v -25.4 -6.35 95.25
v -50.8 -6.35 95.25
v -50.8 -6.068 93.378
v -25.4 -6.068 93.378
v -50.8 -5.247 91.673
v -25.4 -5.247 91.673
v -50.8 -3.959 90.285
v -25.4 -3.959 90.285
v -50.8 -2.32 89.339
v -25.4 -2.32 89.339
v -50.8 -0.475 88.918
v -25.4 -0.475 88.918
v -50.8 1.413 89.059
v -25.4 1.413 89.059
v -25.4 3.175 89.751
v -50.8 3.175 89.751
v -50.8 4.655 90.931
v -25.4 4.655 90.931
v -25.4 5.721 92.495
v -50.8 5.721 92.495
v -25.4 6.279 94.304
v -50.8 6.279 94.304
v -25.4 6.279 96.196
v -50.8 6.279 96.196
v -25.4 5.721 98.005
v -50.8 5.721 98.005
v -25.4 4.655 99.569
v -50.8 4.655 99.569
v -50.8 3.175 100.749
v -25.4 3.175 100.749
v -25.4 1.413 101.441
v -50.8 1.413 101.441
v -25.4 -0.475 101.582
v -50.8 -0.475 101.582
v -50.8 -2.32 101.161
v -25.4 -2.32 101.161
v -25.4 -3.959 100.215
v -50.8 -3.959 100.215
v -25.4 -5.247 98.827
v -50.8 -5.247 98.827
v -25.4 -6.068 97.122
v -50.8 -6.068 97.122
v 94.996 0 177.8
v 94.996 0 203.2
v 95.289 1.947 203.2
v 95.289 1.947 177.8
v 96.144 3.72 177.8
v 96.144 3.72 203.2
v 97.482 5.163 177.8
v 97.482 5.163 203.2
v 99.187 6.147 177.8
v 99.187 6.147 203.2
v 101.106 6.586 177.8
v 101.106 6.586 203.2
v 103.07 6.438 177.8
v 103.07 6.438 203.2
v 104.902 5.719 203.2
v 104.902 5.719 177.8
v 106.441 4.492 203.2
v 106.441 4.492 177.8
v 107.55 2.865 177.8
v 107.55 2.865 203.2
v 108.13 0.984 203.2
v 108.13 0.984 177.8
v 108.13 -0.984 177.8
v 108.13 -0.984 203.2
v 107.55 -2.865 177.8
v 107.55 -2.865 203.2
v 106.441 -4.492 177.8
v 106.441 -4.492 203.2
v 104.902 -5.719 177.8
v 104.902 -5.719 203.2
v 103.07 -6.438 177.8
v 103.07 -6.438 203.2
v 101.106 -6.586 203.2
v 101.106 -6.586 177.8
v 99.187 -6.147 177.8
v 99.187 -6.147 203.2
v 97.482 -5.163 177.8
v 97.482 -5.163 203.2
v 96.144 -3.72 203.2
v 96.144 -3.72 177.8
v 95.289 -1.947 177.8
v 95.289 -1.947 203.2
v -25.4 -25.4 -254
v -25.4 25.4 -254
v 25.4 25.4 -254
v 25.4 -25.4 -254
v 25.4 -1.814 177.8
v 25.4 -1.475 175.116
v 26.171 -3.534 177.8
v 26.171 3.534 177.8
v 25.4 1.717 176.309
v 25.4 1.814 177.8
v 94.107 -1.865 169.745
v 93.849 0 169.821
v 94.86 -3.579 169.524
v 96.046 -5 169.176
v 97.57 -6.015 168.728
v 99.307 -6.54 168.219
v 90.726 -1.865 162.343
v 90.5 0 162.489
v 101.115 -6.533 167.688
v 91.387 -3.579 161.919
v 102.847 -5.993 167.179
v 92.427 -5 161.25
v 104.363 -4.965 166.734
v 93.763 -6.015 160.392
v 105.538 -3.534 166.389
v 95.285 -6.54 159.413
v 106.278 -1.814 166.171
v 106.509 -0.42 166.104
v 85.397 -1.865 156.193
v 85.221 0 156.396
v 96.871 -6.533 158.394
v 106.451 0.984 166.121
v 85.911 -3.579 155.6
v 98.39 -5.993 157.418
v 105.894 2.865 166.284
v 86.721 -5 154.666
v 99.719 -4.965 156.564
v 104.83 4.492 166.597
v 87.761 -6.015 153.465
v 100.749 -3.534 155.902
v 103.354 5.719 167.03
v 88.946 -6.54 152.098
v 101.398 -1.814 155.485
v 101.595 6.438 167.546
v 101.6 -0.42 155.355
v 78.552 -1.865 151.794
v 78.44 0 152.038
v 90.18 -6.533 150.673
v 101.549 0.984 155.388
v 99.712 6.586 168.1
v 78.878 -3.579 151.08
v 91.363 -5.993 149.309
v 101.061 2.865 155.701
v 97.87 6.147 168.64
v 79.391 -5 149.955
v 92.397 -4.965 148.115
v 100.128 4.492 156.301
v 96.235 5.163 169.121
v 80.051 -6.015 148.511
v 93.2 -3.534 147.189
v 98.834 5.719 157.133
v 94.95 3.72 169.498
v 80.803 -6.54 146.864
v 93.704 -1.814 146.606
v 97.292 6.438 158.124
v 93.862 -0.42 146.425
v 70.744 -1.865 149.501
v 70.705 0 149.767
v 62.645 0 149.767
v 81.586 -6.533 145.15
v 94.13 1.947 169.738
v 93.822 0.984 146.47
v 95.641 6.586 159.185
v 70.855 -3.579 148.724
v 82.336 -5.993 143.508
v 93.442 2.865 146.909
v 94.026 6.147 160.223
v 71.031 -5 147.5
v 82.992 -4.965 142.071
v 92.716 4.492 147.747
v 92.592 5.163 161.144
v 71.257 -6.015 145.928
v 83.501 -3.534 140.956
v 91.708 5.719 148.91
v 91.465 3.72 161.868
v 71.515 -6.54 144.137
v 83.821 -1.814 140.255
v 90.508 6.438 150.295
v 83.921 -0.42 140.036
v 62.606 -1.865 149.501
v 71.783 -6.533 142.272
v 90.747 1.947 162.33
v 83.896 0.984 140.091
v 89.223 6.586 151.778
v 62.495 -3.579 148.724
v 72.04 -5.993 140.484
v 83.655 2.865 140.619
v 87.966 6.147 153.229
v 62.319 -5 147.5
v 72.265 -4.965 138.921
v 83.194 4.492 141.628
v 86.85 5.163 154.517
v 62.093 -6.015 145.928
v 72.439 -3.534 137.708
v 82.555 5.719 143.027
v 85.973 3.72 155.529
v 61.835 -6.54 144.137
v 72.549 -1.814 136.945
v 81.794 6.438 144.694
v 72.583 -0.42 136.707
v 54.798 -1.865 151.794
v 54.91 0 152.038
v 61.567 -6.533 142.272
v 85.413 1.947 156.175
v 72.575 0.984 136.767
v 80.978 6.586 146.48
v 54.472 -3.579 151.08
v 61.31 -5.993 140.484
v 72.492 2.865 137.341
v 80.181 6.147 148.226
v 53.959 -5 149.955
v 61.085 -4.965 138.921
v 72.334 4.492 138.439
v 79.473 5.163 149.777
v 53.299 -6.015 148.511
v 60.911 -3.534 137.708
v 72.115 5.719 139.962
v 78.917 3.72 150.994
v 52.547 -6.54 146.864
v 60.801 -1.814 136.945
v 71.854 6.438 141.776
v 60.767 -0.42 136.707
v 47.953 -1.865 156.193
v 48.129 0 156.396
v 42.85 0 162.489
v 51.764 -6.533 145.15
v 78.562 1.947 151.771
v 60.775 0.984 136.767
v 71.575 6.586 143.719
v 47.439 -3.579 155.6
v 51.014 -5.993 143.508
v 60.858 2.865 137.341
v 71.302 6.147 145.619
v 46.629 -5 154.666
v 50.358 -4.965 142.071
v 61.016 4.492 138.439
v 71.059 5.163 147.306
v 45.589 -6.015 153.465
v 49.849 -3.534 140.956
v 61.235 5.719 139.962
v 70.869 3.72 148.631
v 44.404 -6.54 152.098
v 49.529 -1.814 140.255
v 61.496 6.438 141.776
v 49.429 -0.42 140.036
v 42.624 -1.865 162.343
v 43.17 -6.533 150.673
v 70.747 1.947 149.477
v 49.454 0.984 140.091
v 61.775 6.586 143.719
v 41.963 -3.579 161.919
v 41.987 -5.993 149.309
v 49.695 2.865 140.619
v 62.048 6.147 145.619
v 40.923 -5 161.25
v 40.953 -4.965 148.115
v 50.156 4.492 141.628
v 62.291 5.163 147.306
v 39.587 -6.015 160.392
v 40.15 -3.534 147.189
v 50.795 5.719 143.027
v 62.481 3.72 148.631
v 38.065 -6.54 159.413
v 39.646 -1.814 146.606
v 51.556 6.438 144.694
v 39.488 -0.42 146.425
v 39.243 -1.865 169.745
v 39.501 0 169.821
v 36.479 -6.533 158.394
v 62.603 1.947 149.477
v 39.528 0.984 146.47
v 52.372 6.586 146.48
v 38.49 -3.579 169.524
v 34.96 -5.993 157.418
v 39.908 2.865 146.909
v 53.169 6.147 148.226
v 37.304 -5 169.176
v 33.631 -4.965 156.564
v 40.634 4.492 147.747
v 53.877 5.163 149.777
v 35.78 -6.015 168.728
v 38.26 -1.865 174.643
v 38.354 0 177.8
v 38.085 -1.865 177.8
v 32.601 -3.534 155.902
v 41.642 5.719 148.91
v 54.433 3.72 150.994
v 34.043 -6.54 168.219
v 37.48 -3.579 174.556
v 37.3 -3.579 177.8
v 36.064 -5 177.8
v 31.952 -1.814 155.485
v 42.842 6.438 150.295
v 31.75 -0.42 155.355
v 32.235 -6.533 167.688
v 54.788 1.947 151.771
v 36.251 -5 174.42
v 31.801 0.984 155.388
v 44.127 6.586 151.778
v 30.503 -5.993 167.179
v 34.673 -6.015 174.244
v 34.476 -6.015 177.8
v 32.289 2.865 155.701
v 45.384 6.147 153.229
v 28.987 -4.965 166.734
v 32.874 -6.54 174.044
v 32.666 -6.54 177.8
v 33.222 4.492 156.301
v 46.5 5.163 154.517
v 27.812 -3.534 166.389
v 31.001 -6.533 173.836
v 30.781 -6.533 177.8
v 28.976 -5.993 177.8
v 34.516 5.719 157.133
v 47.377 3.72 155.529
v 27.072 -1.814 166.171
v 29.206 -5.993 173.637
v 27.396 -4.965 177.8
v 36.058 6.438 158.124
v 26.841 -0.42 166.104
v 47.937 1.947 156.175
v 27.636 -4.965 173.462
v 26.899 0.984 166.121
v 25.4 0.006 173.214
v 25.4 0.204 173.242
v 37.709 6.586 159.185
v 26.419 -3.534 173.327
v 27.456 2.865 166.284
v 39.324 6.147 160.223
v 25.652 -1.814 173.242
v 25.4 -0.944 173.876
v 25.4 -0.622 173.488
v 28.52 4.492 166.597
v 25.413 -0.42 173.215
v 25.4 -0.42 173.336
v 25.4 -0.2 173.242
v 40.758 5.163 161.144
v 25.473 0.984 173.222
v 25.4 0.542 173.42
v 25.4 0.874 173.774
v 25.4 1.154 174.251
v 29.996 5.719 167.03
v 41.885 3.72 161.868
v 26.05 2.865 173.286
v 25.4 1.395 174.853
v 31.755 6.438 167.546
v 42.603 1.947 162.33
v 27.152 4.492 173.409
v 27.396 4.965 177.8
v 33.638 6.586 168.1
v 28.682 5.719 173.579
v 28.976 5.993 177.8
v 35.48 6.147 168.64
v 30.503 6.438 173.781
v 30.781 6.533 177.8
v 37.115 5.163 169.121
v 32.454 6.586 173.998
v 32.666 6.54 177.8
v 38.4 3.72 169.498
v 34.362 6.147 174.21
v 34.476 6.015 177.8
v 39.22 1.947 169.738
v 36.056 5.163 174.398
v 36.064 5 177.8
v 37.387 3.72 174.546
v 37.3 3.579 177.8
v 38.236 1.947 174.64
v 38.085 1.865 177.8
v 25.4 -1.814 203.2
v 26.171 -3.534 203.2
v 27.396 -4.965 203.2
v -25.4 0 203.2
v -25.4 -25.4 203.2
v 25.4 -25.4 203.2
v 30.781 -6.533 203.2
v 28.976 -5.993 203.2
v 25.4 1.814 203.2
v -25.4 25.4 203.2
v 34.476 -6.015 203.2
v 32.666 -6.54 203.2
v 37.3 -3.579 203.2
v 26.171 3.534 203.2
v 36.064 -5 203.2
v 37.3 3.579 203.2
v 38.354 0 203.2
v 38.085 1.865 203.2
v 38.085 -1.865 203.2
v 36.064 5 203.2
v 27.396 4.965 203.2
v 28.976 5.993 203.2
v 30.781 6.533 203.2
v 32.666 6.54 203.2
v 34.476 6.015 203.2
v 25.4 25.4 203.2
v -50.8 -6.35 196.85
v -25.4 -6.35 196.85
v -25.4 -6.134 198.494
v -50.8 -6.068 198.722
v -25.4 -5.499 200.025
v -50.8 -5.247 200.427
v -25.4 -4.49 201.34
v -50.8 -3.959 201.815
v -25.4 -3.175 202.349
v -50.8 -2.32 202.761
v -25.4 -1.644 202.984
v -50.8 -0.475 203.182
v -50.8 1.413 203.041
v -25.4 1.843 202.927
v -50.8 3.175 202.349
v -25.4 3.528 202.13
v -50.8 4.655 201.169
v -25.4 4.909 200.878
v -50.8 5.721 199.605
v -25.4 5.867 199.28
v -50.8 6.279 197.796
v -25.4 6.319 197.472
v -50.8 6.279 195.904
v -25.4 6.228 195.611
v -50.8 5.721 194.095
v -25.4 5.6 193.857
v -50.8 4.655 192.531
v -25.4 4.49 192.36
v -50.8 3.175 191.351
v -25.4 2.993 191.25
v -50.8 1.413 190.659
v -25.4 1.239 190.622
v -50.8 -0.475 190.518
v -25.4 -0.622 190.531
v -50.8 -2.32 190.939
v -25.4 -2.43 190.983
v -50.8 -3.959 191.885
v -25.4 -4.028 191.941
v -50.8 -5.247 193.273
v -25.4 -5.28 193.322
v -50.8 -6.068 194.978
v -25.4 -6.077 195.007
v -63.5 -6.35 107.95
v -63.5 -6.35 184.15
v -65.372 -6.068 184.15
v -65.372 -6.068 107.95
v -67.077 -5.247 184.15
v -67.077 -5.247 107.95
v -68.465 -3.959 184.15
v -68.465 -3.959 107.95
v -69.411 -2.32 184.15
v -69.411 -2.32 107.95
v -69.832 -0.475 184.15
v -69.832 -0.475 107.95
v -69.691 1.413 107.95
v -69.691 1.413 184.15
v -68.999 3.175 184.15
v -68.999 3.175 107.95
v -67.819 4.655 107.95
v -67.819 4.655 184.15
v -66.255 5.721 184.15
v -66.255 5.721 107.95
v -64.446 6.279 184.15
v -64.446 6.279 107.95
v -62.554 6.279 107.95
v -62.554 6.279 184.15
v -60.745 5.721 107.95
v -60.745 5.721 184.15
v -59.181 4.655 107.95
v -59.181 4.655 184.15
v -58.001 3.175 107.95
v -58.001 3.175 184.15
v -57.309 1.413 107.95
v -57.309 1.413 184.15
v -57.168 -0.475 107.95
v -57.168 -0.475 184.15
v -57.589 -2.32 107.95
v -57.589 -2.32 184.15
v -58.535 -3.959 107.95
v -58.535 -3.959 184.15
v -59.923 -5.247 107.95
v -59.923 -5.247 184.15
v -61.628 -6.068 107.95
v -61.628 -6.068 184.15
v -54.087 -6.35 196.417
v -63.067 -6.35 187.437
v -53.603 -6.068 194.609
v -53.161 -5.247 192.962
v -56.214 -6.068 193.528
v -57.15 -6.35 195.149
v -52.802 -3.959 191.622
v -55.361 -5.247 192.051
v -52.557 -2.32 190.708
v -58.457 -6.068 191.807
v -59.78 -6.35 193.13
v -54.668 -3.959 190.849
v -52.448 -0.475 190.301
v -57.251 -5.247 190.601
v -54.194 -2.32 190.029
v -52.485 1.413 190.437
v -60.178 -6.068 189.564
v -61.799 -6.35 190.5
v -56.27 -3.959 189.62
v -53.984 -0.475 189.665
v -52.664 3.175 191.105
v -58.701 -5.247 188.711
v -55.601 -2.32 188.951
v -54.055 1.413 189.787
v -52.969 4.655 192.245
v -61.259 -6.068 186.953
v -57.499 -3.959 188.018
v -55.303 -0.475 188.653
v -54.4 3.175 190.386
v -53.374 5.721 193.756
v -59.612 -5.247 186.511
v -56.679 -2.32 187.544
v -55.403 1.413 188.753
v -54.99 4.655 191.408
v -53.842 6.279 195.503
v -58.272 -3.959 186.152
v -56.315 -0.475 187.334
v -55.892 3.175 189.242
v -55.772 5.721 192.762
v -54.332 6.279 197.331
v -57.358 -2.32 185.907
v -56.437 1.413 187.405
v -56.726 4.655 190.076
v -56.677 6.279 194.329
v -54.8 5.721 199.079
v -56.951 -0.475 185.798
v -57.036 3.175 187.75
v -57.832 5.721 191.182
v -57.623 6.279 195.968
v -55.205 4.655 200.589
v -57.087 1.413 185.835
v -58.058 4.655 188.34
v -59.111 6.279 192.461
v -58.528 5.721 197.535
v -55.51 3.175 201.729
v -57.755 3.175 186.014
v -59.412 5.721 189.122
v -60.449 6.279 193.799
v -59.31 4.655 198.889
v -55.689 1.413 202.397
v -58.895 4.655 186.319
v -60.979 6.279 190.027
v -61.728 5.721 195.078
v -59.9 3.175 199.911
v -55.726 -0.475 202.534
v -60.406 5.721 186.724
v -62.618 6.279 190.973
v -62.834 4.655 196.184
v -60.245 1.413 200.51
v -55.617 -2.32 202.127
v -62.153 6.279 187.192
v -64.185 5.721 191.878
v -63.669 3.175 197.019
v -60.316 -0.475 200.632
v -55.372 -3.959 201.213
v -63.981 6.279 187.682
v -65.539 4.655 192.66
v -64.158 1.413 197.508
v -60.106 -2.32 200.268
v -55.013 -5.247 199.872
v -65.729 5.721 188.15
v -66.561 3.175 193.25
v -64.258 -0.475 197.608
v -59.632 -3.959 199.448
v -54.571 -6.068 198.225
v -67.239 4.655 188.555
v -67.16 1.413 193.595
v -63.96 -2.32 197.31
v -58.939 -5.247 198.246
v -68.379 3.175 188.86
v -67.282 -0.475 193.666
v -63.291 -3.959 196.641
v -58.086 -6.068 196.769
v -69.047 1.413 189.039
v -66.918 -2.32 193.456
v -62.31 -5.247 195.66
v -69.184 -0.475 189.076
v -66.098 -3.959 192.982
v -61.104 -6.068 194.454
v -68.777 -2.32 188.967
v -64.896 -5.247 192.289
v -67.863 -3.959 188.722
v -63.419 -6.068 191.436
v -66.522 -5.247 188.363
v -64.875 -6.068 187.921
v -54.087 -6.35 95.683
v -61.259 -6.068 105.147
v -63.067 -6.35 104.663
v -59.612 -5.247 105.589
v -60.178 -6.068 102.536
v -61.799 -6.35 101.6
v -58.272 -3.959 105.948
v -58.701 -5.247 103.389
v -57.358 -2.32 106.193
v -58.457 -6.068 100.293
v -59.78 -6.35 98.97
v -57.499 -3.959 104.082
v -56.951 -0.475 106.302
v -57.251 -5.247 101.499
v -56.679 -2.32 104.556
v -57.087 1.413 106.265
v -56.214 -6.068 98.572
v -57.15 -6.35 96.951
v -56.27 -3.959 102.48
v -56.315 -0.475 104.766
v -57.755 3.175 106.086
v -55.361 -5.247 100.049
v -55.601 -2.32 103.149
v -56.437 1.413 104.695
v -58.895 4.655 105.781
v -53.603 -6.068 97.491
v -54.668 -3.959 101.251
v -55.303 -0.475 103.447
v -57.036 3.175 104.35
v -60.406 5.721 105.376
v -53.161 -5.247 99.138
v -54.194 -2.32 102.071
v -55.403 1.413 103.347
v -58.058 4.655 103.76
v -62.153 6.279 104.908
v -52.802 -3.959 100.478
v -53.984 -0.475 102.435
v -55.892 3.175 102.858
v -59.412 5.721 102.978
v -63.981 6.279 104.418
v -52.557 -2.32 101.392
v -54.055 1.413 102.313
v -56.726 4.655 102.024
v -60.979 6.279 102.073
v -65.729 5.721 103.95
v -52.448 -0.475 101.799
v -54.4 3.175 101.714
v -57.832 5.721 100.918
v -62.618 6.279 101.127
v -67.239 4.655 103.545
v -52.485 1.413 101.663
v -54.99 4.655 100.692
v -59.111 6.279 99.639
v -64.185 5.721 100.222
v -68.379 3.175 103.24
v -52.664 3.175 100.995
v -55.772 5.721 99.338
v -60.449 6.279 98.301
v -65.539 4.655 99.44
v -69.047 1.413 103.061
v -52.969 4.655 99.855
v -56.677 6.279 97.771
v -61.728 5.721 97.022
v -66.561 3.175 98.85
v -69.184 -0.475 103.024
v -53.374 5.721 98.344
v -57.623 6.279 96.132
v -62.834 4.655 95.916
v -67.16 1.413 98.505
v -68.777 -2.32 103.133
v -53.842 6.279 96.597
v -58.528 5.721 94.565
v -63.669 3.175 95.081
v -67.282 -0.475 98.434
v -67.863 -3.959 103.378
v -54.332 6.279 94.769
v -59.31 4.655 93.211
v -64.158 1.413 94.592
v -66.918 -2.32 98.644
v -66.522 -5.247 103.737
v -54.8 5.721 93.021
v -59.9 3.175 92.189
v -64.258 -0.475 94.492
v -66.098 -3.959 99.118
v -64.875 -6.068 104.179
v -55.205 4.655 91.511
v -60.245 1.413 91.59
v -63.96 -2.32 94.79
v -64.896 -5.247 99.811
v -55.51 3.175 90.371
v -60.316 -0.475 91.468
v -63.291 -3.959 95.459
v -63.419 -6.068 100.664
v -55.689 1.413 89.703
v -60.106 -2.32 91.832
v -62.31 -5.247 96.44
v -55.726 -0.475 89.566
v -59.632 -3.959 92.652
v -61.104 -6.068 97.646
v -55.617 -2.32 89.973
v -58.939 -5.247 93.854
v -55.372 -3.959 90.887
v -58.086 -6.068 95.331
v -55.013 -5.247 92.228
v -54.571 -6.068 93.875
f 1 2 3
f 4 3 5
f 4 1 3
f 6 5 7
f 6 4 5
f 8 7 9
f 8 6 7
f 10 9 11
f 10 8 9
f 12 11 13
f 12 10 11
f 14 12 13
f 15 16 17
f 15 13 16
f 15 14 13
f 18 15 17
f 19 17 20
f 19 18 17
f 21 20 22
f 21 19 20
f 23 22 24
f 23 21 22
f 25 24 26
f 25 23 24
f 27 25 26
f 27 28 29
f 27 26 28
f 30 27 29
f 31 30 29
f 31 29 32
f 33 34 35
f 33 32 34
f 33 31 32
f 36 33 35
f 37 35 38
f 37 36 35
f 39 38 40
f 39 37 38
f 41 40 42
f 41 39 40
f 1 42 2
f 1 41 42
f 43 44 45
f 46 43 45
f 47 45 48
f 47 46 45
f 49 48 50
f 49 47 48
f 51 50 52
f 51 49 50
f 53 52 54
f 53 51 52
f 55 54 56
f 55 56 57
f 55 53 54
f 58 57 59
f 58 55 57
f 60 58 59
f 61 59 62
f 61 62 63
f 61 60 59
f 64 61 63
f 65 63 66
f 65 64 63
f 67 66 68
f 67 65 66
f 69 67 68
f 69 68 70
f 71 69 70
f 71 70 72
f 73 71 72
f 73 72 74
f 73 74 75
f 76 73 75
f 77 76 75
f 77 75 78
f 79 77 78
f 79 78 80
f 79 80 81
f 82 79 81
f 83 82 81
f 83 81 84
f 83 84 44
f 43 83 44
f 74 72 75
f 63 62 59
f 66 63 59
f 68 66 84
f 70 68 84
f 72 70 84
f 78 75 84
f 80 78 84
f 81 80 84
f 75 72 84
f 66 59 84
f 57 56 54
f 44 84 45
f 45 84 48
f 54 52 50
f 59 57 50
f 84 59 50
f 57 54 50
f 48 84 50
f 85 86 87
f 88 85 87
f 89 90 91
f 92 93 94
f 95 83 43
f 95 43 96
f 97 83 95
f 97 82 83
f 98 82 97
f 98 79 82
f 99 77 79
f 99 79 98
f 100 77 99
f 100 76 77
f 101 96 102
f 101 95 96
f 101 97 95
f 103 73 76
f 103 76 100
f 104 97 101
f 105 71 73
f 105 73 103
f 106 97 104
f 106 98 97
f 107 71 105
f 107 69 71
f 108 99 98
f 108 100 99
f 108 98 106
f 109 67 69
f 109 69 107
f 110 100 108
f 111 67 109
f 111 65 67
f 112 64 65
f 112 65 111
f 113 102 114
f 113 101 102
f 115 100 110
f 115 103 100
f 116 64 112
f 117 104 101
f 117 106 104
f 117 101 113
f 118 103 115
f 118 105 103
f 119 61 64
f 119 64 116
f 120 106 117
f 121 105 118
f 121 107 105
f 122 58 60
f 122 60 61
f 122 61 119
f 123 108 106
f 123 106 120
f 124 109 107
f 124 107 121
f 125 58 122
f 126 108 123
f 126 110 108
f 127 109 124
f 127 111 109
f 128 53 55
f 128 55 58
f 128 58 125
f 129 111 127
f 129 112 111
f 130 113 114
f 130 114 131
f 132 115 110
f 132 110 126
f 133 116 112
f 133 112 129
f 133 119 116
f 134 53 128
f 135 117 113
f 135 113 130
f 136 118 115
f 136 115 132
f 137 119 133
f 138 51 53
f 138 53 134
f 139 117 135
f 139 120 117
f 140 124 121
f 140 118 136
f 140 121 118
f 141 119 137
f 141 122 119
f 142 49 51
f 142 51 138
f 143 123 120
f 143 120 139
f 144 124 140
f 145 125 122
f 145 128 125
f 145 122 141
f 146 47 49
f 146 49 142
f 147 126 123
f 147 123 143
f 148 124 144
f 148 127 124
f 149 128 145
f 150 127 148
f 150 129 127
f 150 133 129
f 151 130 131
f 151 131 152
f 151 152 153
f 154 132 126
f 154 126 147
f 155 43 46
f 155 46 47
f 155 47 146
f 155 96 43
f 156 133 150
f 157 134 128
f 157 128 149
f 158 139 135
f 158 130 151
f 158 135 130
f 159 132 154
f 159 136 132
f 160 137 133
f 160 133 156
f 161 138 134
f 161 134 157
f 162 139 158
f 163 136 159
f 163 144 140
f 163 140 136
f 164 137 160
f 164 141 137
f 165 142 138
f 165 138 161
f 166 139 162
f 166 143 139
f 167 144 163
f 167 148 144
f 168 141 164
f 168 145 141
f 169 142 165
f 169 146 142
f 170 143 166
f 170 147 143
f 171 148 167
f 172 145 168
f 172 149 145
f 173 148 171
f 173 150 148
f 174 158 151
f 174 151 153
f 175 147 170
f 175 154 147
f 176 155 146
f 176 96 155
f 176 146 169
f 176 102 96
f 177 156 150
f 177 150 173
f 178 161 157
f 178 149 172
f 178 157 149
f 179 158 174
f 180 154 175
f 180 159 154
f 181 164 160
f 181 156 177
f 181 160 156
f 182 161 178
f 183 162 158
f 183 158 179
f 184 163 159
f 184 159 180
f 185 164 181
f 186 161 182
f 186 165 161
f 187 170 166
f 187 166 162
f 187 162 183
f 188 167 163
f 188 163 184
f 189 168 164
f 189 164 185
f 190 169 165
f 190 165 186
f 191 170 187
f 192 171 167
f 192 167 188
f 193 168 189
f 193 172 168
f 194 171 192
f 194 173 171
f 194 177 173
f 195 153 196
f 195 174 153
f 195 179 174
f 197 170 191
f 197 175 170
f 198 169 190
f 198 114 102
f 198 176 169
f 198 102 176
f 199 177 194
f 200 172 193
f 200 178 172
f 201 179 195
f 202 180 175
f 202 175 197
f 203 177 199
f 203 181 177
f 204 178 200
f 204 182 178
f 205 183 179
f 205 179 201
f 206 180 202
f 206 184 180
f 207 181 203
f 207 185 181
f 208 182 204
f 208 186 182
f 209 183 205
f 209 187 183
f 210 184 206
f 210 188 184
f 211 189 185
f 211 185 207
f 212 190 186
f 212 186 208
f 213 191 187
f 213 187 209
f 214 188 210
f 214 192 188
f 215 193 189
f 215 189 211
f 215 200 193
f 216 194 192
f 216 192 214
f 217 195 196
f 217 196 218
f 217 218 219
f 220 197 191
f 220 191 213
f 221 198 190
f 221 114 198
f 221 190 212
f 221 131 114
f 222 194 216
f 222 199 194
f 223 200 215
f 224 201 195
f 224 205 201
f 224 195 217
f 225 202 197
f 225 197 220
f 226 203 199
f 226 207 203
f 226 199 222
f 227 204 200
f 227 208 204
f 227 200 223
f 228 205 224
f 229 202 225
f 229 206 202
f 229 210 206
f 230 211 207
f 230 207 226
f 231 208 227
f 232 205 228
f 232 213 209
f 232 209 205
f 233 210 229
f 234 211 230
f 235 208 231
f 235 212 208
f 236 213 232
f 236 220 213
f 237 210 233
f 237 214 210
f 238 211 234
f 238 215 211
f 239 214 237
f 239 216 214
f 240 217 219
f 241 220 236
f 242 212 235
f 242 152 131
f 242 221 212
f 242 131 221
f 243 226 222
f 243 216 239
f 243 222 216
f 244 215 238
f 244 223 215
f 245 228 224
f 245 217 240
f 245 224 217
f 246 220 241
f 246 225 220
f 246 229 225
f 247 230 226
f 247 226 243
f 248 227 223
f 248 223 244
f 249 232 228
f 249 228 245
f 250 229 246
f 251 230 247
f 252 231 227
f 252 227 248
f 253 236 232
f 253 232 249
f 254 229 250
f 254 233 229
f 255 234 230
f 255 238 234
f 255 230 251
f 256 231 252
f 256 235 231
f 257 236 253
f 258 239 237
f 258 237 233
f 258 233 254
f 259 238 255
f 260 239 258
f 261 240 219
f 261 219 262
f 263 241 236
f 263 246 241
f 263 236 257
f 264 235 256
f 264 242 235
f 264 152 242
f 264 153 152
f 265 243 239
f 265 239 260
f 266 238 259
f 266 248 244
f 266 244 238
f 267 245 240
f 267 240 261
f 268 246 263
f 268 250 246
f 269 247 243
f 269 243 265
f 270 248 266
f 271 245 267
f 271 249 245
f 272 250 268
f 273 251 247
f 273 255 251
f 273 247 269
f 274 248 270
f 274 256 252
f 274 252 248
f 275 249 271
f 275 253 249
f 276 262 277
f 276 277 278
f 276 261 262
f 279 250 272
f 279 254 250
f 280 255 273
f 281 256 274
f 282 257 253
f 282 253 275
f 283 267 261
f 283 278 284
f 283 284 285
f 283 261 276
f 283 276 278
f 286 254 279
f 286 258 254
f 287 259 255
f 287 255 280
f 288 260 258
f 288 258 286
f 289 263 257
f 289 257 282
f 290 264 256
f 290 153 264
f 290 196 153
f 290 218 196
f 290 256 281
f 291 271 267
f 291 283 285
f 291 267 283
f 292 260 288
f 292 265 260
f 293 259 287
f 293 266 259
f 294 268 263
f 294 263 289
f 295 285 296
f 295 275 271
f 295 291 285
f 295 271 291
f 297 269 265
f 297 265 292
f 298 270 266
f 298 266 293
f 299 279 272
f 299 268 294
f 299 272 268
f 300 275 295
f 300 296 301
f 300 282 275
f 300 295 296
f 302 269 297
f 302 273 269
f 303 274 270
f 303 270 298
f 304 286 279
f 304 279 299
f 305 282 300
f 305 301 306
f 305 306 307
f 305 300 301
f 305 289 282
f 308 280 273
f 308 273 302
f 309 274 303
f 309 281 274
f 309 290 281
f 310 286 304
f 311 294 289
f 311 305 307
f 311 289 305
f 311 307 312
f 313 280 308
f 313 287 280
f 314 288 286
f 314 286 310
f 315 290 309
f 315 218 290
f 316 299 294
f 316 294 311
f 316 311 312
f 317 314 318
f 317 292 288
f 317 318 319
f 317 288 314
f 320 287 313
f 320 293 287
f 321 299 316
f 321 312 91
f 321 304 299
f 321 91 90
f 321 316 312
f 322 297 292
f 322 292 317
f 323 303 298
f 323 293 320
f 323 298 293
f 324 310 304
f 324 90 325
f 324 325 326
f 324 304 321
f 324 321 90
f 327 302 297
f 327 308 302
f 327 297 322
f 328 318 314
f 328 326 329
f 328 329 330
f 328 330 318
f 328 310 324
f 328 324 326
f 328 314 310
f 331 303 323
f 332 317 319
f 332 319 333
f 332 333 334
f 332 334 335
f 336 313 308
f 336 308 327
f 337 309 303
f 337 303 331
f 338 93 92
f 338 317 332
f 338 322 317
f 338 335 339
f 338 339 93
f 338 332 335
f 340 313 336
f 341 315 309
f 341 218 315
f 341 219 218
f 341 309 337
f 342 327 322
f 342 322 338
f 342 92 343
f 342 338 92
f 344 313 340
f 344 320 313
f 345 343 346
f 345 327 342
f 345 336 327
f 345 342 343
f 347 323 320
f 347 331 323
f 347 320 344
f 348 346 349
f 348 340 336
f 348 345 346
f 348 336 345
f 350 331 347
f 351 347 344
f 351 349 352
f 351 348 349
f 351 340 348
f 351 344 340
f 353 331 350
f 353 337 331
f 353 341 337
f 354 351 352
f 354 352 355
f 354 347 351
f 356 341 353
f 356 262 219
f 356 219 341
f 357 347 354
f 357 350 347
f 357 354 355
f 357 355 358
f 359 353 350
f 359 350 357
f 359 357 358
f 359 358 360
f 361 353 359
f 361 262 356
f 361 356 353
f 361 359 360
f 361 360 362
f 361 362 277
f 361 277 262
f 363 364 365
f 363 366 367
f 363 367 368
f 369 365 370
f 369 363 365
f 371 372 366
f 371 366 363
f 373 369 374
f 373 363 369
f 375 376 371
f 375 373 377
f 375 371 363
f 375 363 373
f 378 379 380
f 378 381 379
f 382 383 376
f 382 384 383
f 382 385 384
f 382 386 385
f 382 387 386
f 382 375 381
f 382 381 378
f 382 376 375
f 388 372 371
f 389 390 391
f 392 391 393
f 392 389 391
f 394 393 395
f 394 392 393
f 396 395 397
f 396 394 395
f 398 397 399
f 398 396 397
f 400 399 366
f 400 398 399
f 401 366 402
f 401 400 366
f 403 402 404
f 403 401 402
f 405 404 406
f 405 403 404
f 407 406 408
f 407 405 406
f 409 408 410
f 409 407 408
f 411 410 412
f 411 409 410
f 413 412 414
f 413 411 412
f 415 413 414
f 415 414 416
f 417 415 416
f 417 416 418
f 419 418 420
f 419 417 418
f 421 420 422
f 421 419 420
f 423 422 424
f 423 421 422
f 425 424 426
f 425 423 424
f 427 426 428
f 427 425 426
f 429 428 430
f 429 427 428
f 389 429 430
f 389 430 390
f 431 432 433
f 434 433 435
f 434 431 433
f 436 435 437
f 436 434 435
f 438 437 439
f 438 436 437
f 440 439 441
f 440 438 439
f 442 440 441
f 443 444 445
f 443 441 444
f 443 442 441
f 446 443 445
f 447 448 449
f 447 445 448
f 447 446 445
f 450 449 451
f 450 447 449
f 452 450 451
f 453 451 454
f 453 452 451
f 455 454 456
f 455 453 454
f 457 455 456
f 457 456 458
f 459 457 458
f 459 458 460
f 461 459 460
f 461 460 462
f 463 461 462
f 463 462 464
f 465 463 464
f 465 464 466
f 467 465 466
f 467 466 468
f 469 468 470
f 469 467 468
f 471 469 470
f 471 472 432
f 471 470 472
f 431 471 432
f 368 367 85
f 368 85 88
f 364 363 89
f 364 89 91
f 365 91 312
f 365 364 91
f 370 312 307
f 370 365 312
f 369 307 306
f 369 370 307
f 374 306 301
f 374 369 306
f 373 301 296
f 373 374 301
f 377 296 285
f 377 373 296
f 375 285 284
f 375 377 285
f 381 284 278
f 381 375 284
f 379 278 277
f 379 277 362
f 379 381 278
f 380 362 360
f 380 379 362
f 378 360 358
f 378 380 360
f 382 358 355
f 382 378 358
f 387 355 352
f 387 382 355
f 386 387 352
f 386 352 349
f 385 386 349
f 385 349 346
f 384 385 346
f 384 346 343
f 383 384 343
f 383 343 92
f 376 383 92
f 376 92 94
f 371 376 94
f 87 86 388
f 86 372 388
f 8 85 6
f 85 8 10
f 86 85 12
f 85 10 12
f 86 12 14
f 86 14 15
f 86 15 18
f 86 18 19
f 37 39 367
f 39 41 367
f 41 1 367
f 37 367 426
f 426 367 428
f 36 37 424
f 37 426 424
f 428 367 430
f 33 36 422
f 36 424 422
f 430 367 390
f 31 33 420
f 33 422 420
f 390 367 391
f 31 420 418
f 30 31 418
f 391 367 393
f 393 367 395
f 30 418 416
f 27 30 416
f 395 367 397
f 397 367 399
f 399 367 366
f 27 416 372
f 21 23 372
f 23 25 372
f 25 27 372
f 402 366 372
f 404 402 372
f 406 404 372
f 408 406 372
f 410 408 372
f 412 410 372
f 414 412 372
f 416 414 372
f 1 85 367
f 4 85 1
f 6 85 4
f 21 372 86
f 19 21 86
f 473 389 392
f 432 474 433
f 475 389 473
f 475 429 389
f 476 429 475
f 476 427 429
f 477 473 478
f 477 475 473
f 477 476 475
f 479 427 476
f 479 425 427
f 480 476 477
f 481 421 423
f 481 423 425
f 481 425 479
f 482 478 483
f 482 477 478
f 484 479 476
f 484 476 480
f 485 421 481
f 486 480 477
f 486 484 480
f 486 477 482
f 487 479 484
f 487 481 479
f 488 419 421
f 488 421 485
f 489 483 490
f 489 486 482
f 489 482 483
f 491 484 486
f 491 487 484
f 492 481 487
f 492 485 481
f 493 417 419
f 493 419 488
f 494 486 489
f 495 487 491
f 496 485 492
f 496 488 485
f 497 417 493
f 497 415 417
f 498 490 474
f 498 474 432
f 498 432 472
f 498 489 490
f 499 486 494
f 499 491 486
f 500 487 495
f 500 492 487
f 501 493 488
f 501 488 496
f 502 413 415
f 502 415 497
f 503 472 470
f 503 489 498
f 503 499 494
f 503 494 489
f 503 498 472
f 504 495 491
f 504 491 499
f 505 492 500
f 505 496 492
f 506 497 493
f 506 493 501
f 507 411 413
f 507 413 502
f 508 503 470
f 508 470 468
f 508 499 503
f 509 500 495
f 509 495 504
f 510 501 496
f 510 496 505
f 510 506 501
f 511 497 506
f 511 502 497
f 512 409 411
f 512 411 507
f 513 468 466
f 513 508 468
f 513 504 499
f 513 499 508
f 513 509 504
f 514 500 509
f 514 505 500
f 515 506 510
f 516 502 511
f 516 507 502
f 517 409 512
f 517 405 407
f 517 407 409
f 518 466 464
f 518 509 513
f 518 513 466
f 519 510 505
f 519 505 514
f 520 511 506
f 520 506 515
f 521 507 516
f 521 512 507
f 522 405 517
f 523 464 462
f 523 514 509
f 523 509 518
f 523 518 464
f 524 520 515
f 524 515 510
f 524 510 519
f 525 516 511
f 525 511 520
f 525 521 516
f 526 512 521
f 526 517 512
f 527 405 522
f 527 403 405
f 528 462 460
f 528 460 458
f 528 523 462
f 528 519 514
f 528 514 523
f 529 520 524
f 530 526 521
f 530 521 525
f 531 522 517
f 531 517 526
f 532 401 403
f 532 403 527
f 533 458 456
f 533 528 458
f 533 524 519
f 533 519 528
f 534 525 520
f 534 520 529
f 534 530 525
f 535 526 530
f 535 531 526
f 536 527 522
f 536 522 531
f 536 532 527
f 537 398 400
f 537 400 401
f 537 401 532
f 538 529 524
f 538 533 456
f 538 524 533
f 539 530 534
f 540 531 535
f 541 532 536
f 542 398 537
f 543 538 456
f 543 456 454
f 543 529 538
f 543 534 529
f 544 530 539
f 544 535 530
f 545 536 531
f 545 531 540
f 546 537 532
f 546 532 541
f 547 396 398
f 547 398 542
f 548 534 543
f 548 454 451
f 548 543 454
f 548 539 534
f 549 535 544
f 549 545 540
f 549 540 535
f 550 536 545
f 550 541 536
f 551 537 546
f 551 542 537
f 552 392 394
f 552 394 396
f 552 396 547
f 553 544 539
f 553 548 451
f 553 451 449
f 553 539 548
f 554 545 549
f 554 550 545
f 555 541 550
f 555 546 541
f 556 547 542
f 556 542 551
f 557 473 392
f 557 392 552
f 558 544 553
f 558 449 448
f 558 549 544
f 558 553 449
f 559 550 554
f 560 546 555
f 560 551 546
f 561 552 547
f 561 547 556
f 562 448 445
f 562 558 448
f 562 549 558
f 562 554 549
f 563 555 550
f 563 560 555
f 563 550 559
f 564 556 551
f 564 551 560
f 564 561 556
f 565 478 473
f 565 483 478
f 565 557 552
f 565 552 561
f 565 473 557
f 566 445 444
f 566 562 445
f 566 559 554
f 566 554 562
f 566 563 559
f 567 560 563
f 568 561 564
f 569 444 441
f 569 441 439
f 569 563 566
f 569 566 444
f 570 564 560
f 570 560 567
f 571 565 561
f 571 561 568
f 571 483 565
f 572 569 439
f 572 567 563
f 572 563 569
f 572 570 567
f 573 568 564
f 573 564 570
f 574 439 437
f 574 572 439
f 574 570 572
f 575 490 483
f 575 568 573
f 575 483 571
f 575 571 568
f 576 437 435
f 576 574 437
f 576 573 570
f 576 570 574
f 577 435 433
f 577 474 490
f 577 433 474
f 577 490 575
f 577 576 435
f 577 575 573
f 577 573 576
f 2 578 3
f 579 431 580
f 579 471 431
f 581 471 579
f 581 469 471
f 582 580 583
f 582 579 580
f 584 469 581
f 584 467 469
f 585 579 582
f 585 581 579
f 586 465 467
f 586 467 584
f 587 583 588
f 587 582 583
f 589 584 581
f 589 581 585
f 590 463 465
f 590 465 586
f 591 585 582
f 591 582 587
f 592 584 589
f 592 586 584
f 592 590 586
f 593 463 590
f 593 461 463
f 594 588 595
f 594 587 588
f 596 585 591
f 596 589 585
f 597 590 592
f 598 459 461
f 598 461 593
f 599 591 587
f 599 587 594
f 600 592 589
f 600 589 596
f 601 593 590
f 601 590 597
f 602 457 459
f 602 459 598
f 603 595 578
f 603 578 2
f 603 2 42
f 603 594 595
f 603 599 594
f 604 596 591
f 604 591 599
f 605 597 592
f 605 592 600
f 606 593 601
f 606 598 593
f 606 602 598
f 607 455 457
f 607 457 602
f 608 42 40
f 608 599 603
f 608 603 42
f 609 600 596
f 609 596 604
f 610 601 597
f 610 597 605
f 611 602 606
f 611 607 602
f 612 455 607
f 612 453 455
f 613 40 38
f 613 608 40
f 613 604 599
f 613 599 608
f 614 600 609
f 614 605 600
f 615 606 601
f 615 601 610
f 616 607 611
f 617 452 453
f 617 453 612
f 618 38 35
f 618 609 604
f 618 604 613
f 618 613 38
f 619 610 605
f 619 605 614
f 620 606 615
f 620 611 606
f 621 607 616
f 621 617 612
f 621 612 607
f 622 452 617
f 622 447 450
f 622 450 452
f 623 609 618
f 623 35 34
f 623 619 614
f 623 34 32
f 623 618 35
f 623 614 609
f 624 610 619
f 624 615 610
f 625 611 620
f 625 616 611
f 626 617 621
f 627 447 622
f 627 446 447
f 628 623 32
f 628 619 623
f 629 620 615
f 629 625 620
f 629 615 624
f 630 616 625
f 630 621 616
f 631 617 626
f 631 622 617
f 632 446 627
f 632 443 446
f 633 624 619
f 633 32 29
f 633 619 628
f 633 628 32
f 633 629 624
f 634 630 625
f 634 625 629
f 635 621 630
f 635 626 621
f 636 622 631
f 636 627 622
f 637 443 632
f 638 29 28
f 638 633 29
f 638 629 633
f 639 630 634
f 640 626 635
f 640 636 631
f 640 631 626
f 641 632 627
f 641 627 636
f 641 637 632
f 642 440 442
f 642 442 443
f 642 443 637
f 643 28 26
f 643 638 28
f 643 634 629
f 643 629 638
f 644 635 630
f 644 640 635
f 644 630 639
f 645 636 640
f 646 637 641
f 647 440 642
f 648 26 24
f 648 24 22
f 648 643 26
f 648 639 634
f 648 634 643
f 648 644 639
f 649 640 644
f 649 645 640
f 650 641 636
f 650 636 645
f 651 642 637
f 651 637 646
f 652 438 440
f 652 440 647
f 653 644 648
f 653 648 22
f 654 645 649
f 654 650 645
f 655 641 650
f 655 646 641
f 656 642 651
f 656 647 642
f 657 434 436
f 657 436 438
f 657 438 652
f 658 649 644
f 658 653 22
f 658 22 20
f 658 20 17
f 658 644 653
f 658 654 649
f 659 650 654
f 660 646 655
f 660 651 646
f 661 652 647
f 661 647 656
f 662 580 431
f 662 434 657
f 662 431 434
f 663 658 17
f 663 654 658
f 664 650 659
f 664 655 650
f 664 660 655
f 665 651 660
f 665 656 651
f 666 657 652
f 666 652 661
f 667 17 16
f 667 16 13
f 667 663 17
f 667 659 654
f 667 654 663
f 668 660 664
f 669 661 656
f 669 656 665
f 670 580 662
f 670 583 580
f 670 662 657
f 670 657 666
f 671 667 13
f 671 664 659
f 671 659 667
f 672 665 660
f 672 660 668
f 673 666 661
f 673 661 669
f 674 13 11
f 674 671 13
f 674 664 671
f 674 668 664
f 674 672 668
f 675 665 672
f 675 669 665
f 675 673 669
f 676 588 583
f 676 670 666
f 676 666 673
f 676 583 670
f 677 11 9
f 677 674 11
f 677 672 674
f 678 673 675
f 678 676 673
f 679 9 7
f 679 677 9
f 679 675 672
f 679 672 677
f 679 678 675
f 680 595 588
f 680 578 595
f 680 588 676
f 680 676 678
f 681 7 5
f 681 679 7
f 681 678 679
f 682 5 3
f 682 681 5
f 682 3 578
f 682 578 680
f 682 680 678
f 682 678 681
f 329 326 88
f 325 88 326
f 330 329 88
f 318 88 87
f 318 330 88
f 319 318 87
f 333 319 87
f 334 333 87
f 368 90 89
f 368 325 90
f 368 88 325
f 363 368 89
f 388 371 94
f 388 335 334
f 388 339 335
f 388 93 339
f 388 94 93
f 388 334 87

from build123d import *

# Parameters (mm, degrees)
F0_W          = 50.8
F0_H          = 50.8
F1_DEPTH      = 203.2
F1_DEPTH_BACK = 254
F3_R          = 6.604
F6_R          = 6.35


with BuildPart() as f1:
    # F0 (on Top) → F1 (new body, two sides)
    with BuildSketch(Plane.XY) as f1_sk:
        Rectangle(F0_W, F0_H)
    extrude(amount=F1_DEPTH)
    extrude(f1_sk.sketch, amount=-F1_DEPTH_BACK)

    # F4: sweep along a path in F2
    with BuildLine(Plane.XZ) as f4_path:
        Line((101.6, 203.2), (101.6, 177.8))
        ThreePointArc((101.6, 177.8), (66.675, 142.875), (31.75, 177.8))
        Line((31.75, 177.8), (31.75, 203.2))
    # F3 (on face) → F4 (sweep)
    with BuildSketch(Plane.XY.offset(203.2)):
        with Locations((31.75, 0)):
            Circle(F3_R)
    sweep(path=f4_path.line)

    # F7: sweep along a path in F5
    with BuildLine(Plane.XZ) as f7_path:
        Line((-25.4, 196.85), (-50.8, 196.85))
        ThreePointArc((-50.8, 196.85), (-59.7802561211, 193.1302561211), (-63.5, 184.15))
        Line((-63.5, 184.15), (-63.5, 107.95))
        ThreePointArc((-63.5, 107.95), (-59.7802561211, 98.9697438789), (-50.8, 95.25))
        Line((-50.8, 95.25), (-25.3296792507, 95.25))
    # F6 (on face) → F7 (sweep)
    with BuildSketch(Plane(origin=(-25.4, 0, 0), x_dir=(0, -1, 0), z_dir=(-1, 0, 0))):
        with Locations((0, 196.85)):
            Circle(F6_R)
    sweep(path=f7_path.line)


solid = f1.part
